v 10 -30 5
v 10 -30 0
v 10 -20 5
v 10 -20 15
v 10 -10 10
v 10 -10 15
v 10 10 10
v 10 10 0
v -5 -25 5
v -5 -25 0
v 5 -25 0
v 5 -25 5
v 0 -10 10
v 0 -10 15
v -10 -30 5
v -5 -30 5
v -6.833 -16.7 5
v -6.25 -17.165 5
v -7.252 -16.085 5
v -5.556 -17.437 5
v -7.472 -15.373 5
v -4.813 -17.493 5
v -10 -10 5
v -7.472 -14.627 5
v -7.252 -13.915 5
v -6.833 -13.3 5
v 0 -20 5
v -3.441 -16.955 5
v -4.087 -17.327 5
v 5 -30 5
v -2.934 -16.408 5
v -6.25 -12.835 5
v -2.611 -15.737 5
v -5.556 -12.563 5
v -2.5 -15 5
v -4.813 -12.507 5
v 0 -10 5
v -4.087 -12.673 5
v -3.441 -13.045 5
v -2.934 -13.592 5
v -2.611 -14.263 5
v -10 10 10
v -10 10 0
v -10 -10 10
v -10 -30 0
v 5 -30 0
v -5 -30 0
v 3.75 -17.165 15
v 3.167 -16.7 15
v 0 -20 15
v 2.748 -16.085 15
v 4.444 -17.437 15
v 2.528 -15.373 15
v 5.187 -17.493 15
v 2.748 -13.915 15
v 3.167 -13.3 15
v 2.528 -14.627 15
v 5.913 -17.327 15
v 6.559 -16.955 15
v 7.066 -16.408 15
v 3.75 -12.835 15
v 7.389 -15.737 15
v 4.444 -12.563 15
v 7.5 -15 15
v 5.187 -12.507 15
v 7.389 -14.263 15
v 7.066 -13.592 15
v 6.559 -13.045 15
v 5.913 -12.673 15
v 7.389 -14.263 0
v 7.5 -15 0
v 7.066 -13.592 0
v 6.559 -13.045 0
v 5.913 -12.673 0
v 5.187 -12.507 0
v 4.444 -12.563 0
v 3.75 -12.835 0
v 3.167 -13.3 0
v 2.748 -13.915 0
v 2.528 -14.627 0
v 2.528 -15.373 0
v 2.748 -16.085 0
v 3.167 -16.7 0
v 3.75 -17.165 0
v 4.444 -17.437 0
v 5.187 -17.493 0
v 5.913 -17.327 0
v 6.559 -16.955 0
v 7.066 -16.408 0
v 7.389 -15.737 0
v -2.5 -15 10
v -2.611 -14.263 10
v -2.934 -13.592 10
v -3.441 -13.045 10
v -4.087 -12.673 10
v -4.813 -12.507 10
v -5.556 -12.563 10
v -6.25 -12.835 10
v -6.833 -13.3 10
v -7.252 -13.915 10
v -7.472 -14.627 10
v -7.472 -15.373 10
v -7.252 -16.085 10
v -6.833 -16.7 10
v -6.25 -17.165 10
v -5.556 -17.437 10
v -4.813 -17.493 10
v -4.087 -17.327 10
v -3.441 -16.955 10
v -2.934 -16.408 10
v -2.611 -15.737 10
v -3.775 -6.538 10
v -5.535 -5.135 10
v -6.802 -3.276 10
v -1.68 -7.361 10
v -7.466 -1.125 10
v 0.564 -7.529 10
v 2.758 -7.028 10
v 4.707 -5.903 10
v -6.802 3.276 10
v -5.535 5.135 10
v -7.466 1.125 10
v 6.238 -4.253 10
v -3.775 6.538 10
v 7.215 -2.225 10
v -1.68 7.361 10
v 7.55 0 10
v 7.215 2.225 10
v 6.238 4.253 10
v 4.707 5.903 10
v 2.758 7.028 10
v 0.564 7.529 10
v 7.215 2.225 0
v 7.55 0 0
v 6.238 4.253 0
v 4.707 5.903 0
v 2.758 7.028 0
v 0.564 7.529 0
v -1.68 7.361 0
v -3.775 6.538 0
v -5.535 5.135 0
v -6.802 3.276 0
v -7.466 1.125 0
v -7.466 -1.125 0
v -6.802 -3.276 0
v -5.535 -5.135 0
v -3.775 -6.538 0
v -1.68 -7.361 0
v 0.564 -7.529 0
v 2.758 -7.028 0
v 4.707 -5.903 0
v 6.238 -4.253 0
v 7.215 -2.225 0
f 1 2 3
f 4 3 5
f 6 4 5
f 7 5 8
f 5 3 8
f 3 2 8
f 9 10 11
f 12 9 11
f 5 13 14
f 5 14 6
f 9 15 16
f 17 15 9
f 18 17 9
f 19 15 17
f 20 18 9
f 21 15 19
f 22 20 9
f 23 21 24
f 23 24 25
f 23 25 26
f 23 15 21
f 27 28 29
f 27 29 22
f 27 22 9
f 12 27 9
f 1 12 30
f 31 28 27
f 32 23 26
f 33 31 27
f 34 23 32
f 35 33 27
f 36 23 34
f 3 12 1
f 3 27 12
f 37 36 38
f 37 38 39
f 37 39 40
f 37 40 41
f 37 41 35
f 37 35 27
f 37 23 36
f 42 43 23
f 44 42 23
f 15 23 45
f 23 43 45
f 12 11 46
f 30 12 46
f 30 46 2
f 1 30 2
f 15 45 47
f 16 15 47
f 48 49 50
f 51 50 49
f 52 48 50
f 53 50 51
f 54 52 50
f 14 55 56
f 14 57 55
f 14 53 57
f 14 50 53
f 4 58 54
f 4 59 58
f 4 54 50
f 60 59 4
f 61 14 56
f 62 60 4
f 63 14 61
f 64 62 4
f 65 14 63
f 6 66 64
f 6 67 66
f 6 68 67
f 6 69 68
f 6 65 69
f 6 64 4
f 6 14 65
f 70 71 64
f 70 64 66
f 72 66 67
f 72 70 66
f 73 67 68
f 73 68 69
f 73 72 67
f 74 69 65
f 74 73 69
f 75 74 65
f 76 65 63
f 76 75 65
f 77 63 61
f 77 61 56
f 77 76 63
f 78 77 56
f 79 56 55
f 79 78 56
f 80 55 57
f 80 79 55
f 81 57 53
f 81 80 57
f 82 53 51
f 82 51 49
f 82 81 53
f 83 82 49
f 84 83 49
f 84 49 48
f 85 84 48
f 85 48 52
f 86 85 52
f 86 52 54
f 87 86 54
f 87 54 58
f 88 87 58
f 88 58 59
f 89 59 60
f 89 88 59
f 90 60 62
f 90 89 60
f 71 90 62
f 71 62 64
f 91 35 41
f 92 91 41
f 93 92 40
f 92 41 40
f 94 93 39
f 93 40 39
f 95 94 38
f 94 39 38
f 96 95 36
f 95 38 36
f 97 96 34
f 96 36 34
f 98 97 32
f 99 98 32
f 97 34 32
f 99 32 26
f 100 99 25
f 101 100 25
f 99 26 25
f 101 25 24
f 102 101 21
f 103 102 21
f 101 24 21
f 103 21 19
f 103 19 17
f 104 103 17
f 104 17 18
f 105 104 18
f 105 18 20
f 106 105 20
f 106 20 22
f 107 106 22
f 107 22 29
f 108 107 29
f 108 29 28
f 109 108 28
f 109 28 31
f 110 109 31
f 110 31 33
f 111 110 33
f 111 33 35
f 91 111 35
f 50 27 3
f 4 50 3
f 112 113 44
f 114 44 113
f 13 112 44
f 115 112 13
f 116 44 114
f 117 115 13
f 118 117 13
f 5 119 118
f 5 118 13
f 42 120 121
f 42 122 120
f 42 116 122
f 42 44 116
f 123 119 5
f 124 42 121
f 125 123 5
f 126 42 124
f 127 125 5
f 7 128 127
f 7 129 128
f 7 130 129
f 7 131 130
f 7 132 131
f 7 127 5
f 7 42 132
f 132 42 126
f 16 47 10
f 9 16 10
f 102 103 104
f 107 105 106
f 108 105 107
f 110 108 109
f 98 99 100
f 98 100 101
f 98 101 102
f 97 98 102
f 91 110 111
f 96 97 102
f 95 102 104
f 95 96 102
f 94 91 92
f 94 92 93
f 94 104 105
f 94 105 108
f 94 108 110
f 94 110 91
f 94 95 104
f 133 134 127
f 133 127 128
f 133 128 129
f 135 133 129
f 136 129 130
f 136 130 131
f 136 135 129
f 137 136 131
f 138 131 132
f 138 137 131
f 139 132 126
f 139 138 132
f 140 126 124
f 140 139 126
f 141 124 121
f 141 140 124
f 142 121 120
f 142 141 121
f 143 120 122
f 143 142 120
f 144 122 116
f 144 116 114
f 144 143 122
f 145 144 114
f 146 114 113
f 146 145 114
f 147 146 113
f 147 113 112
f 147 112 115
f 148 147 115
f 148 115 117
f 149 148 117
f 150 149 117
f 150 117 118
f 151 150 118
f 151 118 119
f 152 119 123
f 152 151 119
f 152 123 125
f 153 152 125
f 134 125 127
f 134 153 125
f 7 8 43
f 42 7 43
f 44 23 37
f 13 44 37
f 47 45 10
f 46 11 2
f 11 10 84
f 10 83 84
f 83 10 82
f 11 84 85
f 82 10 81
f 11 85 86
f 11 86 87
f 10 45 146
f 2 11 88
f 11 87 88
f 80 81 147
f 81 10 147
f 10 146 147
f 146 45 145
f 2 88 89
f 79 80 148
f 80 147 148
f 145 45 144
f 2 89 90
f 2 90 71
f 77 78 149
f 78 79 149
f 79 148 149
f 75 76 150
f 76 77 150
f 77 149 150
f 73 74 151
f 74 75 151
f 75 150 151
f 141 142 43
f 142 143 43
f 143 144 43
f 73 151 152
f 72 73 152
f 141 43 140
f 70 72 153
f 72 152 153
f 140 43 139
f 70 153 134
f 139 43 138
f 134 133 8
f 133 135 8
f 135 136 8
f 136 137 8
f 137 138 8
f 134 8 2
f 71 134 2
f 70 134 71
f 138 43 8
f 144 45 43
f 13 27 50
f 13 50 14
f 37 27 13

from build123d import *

# Parameters (mm, degrees)
F0_R     = 7.55
F1_DEPTH = 10
F0_W     = 10
F0_H     = 10
F0_R_2   = 2.5
F2_DEPTH = 5
F3_DEPTH = 15
F4_DEPTH = 10


with BuildPart() as f1:
    # F0 (on Top) → F1 (new body)
    with BuildSketch(Plane.XY):
        Polygon((10, -10), (10, 10), (-10, 10), (-10, -10), (0, -10), align=None)
        Circle(F0_R, mode=Mode.SUBTRACT)
    extrude(amount=F1_DEPTH)

    # F0 (on Top) → F2 (join)
    with BuildSketch(Plane.XY):
        with Locations((-5, -15)):
            Rectangle(F0_W, F0_H)
        with Locations((-5, -15)):
            Circle(F0_R_2, mode=Mode.SUBTRACT)
        Polygon((10, -30), (10, -20), (0, -20), (-10, -20), (-10, -30), (-5, -30), (-5, -25), (5, -25), (5, -30), align=None)
        with Locations((-5, -15)):
            Circle(F0_R_2)
    extrude(amount=F2_DEPTH)

    # F0 (on Top) → F3 (join)
    with BuildSketch(Plane.XY):
        with Locations((5, -15)):
            Rectangle(F0_W, F0_H)
        with Locations((5, -15)):
            Circle(F0_R_2, mode=Mode.SUBTRACT)
    extrude(amount=F3_DEPTH)

    # F0 (on Top) → F4 (join)
    with BuildSketch(Plane.XY):
        with Locations((-5, -15)):
            Circle(F0_R_2)
    extrude(amount=F4_DEPTH)


solid = f1.part
